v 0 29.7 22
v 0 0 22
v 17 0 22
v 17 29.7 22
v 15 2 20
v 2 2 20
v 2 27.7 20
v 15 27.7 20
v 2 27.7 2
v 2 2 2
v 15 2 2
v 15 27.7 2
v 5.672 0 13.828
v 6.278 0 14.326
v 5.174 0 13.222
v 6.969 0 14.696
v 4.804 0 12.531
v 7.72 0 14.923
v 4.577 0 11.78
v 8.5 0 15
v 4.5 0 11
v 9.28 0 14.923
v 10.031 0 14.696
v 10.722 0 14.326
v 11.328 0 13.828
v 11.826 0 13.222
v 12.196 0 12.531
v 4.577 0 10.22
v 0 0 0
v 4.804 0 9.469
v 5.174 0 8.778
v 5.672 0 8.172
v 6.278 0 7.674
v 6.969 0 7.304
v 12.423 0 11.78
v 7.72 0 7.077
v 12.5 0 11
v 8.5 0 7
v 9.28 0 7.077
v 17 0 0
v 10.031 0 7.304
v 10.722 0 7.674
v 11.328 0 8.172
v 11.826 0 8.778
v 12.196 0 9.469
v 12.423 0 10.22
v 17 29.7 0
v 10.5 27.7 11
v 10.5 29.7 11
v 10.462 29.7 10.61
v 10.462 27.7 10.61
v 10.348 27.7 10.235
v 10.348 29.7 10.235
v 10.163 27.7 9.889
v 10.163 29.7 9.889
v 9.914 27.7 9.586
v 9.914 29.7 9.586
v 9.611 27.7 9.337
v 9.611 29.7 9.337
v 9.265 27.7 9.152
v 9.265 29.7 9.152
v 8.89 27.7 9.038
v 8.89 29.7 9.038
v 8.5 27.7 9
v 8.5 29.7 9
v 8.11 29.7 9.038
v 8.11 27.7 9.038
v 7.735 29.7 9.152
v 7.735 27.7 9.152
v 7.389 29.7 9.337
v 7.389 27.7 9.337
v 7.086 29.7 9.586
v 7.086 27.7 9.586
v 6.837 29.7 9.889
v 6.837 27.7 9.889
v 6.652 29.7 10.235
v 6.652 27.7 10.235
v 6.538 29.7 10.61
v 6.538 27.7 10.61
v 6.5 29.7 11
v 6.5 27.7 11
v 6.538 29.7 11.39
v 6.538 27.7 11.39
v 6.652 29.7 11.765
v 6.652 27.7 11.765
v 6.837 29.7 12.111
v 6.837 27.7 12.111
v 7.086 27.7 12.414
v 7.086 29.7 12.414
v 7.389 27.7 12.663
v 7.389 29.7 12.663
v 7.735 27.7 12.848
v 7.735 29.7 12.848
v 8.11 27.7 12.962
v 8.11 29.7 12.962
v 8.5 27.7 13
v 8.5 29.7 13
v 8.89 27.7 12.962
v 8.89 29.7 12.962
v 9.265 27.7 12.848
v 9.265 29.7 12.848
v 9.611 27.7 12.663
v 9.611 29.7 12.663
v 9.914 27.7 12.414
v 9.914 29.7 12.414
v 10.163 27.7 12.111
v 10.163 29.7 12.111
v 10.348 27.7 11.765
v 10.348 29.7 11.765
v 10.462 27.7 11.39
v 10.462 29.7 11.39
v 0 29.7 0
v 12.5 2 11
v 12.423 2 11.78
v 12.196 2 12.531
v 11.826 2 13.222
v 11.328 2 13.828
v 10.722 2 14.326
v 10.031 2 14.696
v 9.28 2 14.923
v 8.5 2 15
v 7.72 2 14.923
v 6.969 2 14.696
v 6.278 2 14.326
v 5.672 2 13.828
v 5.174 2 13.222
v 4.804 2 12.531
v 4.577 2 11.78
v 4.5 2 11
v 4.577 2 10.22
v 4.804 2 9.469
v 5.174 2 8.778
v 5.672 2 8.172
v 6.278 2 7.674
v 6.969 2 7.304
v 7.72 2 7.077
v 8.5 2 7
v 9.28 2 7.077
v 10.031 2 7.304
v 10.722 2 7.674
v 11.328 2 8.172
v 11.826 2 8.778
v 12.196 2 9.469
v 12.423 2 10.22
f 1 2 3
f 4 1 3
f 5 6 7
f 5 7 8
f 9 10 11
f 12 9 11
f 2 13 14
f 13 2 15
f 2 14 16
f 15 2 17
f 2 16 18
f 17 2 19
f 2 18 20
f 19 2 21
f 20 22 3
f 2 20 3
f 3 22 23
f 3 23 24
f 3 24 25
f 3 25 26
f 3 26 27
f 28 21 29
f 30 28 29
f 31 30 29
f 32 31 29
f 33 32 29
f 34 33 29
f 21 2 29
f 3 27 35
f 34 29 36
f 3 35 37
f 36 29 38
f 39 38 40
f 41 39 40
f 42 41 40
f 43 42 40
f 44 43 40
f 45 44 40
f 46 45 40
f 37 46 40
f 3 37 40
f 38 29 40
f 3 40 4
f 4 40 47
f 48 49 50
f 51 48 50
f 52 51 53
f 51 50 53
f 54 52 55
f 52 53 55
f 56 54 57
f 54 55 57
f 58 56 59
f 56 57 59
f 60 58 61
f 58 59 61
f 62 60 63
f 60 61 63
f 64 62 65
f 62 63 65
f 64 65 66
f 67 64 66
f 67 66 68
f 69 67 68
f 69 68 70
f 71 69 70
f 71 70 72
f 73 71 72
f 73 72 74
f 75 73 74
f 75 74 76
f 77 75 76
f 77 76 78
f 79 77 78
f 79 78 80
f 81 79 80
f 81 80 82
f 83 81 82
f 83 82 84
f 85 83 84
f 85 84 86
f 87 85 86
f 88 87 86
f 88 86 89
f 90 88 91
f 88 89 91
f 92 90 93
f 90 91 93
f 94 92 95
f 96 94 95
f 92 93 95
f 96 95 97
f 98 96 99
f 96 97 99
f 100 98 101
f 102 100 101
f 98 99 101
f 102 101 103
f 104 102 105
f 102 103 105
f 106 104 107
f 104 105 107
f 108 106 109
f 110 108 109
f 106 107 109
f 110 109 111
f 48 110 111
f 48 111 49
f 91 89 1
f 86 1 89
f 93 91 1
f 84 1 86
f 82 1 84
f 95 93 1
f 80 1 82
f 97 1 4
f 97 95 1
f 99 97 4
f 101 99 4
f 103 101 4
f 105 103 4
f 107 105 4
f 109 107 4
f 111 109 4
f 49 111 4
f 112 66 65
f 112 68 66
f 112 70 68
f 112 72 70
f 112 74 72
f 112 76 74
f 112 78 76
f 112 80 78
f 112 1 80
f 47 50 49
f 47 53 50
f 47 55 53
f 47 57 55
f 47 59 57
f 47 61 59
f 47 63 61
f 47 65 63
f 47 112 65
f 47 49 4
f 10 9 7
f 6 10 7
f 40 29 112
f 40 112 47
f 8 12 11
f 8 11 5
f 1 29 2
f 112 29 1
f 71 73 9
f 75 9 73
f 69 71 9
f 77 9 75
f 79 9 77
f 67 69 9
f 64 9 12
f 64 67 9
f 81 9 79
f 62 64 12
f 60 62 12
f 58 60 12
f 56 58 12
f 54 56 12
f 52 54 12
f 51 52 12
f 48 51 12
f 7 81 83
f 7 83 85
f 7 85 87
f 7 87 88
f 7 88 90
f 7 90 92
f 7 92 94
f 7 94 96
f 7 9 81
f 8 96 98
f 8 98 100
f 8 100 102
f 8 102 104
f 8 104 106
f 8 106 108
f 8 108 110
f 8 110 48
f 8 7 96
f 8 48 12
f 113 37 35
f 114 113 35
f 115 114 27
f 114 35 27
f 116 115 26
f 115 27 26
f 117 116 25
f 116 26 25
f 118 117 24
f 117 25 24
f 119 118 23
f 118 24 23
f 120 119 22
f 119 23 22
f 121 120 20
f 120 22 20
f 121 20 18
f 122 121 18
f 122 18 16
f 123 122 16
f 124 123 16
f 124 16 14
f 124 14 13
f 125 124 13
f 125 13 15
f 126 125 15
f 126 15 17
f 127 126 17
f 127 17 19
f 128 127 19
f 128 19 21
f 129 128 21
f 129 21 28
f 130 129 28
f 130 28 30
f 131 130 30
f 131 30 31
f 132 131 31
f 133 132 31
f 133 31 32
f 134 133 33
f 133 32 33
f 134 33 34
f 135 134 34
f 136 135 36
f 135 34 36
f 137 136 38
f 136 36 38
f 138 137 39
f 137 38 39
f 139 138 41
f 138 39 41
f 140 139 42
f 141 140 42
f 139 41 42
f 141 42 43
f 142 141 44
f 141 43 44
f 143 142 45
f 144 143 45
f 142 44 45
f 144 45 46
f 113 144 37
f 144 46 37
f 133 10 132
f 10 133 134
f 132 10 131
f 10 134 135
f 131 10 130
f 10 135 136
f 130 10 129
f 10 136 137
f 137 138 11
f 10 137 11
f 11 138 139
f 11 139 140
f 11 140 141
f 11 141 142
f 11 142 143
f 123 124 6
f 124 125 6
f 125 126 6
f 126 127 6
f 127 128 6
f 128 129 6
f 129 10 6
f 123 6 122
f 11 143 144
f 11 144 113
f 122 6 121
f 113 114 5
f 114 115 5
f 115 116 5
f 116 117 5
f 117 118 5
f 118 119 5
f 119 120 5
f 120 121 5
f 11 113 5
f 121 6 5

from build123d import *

# Parameters (mm, degrees)
SKETCH1_W           = 17
SKETCH1_H           = 29.7
BOSS_EXTRUDE1_DEPTH = 22
SKETCH2_R           = 2
CUT_EXTRUDE1_DEPTH  = 30.7
SKETCH3_R           = 4
CUT_EXTRUDE2_DEPTH  = 27.7
CUT_EXTRUDE4_START  = -2
SKETCH4_W           = 13
SKETCH4_H           = 18
CUT_EXTRUDE4_DEPTH  = 25.7


with BuildPart() as part:
    # Sketch1 → Boss-Extrude1 (new body)
    with BuildSketch(Plane.XY):
        with Locations((8.5, 14.85)):
            Rectangle(SKETCH1_W, SKETCH1_H)
    extrude(amount=BOSS_EXTRUDE1_DEPTH)

    # Sketch2 → Cut-Extrude1 (cut, through all)
    with BuildSketch(Plane(origin=(0, 29.7, 0), x_dir=(1, 0, 0), z_dir=(0, 1, 0))):
        with Locations((8.5, -11)):
            Circle(SKETCH2_R)
    extrude(amount=-CUT_EXTRUDE1_DEPTH, mode=Mode.SUBTRACT)

    # Sketch3 → Cut-Extrude2 (cut)
    with BuildSketch(Plane.XZ):
        with Locations((8.5, 11)):
            Circle(SKETCH3_R)
    extrude(amount=-CUT_EXTRUDE2_DEPTH, mode=Mode.SUBTRACT)

    # Sketch4 → Cut-Extrude4 (cut)
    with BuildSketch(Plane.XZ.offset(CUT_EXTRUDE4_START)):
        with Locations((8.5, 11)):
            Rectangle(SKETCH4_W, SKETCH4_H)
    extrude(amount=-CUT_EXTRUDE4_DEPTH, mode=Mode.SUBTRACT)


solid = part.part
